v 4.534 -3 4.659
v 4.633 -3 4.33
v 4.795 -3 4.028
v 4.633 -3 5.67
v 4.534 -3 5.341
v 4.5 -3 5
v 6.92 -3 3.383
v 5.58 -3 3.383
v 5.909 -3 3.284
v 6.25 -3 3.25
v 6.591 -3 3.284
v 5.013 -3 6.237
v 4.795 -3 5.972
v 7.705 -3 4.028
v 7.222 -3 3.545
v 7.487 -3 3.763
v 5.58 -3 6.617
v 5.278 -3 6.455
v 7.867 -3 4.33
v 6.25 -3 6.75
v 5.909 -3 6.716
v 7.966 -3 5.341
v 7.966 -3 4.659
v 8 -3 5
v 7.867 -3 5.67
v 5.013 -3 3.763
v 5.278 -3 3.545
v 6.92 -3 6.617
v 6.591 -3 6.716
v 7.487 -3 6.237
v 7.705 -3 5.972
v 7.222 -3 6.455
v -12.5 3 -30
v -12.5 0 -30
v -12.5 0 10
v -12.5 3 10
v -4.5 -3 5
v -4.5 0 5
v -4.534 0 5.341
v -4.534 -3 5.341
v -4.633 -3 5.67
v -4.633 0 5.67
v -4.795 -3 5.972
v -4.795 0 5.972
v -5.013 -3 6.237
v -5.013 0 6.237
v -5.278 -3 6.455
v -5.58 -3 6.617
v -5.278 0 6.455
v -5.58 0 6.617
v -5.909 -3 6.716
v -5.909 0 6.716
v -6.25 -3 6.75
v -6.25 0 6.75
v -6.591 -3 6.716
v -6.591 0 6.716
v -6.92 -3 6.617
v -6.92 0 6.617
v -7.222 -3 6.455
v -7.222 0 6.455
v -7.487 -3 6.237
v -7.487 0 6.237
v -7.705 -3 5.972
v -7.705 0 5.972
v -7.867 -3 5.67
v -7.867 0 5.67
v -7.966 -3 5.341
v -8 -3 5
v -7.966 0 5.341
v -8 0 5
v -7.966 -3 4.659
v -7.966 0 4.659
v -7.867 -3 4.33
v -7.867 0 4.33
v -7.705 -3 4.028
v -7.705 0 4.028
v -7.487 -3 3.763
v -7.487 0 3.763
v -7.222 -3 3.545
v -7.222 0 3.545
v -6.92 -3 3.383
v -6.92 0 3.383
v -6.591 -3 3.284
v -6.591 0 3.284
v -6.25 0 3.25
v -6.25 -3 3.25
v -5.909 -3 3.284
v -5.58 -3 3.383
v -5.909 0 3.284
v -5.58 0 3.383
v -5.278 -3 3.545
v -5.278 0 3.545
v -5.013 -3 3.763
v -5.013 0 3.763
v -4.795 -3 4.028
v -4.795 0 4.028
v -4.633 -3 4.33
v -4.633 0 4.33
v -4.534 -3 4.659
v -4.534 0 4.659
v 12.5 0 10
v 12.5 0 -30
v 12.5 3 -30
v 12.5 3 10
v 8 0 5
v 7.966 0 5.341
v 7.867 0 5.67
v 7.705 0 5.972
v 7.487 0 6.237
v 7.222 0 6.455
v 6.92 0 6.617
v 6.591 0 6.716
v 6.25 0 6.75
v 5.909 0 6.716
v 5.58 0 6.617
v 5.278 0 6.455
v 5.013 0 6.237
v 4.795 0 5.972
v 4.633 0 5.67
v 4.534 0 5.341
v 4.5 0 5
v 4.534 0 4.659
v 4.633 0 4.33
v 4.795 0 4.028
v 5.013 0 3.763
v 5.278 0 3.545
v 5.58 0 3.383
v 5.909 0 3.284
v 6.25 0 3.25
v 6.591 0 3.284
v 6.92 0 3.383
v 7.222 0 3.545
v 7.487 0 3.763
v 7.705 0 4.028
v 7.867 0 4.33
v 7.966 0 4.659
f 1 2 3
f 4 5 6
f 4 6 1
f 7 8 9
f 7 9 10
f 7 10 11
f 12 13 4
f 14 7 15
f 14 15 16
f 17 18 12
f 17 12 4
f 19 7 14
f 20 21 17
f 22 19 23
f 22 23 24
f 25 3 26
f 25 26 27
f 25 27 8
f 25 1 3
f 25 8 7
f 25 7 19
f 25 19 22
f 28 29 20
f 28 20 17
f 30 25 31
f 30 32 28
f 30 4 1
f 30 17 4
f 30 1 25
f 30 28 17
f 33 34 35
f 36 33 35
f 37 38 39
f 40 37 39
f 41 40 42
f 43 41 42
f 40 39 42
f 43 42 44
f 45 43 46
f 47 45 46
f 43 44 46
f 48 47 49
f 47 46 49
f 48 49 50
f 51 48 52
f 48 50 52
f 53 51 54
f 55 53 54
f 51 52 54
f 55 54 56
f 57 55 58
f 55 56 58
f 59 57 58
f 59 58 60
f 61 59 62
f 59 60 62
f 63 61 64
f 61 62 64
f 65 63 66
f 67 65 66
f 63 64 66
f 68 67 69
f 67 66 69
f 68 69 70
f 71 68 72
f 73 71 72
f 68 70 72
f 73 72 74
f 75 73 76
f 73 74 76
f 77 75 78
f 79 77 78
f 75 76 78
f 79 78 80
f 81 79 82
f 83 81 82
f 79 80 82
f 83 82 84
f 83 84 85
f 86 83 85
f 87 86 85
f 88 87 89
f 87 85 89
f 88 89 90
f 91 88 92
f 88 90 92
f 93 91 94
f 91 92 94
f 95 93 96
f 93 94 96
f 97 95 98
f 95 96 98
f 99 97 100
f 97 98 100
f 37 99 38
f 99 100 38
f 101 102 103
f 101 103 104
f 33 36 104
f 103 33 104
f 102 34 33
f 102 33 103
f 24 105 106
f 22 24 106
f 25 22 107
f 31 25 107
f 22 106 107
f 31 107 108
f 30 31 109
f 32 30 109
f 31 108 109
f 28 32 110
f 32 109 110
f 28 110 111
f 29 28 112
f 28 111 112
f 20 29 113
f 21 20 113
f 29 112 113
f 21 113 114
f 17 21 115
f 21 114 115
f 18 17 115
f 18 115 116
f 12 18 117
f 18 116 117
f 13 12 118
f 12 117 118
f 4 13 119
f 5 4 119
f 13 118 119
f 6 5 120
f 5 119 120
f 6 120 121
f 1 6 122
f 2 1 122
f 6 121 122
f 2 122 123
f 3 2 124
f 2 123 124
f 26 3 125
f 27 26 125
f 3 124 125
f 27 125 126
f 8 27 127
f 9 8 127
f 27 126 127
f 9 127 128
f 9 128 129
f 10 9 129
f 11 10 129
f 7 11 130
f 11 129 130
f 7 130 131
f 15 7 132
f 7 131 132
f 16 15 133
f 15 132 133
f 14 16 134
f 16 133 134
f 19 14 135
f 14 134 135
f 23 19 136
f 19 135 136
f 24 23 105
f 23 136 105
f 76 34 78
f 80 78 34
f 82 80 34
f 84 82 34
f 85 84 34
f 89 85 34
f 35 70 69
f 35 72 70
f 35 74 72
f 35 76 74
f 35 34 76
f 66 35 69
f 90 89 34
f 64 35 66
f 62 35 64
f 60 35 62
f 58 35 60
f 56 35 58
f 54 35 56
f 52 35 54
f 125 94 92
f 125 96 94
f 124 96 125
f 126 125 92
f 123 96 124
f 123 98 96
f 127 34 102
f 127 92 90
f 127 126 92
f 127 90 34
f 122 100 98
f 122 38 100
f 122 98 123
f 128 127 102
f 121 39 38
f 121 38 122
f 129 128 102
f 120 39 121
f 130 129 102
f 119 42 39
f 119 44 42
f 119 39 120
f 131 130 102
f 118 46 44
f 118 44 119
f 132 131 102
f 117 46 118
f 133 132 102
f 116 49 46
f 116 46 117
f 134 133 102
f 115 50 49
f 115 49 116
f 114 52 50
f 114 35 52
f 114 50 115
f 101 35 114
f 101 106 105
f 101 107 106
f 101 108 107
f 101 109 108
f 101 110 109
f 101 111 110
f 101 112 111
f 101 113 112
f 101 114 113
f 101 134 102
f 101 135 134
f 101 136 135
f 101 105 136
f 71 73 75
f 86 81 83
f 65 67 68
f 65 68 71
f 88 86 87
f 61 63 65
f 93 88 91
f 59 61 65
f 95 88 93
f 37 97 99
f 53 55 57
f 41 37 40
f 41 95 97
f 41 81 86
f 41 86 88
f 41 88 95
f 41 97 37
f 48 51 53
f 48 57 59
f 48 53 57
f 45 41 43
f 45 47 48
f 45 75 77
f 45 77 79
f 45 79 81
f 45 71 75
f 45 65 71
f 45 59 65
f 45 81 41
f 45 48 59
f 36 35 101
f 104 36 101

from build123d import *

# Parameters (mm, degrees)
F0_W     = 25
F0_H     = 40
F0_R     = 1.75
F1_DEPTH = 3
F2_DEPTH = 3


with BuildPart() as f1:
    # F0 (on Front) → F1 (new body)
    with BuildSketch(Plane.XZ):
        with Locations((0, -10)):
            Rectangle(F0_W, F0_H)
        with Locations((-6.25, 5)):
            Circle(F0_R, mode=Mode.SUBTRACT)
        with Locations((6.25, 5)):
            Circle(F0_R, mode=Mode.SUBTRACT)
        with Locations((-6.25, 5)):
            Circle(F0_R)
        with Locations((6.25, 5)):
            Circle(F0_R)
    extrude(amount=-F1_DEPTH)

    # F0 (on Front) → F2 (join)
    with BuildSketch(Plane.XZ):
        with Locations((-6.25, 5)):
            Circle(F0_R)
        with Locations((6.25, 5)):
            Circle(F0_R)
    extrude(amount=F2_DEPTH)


solid = f1.part
